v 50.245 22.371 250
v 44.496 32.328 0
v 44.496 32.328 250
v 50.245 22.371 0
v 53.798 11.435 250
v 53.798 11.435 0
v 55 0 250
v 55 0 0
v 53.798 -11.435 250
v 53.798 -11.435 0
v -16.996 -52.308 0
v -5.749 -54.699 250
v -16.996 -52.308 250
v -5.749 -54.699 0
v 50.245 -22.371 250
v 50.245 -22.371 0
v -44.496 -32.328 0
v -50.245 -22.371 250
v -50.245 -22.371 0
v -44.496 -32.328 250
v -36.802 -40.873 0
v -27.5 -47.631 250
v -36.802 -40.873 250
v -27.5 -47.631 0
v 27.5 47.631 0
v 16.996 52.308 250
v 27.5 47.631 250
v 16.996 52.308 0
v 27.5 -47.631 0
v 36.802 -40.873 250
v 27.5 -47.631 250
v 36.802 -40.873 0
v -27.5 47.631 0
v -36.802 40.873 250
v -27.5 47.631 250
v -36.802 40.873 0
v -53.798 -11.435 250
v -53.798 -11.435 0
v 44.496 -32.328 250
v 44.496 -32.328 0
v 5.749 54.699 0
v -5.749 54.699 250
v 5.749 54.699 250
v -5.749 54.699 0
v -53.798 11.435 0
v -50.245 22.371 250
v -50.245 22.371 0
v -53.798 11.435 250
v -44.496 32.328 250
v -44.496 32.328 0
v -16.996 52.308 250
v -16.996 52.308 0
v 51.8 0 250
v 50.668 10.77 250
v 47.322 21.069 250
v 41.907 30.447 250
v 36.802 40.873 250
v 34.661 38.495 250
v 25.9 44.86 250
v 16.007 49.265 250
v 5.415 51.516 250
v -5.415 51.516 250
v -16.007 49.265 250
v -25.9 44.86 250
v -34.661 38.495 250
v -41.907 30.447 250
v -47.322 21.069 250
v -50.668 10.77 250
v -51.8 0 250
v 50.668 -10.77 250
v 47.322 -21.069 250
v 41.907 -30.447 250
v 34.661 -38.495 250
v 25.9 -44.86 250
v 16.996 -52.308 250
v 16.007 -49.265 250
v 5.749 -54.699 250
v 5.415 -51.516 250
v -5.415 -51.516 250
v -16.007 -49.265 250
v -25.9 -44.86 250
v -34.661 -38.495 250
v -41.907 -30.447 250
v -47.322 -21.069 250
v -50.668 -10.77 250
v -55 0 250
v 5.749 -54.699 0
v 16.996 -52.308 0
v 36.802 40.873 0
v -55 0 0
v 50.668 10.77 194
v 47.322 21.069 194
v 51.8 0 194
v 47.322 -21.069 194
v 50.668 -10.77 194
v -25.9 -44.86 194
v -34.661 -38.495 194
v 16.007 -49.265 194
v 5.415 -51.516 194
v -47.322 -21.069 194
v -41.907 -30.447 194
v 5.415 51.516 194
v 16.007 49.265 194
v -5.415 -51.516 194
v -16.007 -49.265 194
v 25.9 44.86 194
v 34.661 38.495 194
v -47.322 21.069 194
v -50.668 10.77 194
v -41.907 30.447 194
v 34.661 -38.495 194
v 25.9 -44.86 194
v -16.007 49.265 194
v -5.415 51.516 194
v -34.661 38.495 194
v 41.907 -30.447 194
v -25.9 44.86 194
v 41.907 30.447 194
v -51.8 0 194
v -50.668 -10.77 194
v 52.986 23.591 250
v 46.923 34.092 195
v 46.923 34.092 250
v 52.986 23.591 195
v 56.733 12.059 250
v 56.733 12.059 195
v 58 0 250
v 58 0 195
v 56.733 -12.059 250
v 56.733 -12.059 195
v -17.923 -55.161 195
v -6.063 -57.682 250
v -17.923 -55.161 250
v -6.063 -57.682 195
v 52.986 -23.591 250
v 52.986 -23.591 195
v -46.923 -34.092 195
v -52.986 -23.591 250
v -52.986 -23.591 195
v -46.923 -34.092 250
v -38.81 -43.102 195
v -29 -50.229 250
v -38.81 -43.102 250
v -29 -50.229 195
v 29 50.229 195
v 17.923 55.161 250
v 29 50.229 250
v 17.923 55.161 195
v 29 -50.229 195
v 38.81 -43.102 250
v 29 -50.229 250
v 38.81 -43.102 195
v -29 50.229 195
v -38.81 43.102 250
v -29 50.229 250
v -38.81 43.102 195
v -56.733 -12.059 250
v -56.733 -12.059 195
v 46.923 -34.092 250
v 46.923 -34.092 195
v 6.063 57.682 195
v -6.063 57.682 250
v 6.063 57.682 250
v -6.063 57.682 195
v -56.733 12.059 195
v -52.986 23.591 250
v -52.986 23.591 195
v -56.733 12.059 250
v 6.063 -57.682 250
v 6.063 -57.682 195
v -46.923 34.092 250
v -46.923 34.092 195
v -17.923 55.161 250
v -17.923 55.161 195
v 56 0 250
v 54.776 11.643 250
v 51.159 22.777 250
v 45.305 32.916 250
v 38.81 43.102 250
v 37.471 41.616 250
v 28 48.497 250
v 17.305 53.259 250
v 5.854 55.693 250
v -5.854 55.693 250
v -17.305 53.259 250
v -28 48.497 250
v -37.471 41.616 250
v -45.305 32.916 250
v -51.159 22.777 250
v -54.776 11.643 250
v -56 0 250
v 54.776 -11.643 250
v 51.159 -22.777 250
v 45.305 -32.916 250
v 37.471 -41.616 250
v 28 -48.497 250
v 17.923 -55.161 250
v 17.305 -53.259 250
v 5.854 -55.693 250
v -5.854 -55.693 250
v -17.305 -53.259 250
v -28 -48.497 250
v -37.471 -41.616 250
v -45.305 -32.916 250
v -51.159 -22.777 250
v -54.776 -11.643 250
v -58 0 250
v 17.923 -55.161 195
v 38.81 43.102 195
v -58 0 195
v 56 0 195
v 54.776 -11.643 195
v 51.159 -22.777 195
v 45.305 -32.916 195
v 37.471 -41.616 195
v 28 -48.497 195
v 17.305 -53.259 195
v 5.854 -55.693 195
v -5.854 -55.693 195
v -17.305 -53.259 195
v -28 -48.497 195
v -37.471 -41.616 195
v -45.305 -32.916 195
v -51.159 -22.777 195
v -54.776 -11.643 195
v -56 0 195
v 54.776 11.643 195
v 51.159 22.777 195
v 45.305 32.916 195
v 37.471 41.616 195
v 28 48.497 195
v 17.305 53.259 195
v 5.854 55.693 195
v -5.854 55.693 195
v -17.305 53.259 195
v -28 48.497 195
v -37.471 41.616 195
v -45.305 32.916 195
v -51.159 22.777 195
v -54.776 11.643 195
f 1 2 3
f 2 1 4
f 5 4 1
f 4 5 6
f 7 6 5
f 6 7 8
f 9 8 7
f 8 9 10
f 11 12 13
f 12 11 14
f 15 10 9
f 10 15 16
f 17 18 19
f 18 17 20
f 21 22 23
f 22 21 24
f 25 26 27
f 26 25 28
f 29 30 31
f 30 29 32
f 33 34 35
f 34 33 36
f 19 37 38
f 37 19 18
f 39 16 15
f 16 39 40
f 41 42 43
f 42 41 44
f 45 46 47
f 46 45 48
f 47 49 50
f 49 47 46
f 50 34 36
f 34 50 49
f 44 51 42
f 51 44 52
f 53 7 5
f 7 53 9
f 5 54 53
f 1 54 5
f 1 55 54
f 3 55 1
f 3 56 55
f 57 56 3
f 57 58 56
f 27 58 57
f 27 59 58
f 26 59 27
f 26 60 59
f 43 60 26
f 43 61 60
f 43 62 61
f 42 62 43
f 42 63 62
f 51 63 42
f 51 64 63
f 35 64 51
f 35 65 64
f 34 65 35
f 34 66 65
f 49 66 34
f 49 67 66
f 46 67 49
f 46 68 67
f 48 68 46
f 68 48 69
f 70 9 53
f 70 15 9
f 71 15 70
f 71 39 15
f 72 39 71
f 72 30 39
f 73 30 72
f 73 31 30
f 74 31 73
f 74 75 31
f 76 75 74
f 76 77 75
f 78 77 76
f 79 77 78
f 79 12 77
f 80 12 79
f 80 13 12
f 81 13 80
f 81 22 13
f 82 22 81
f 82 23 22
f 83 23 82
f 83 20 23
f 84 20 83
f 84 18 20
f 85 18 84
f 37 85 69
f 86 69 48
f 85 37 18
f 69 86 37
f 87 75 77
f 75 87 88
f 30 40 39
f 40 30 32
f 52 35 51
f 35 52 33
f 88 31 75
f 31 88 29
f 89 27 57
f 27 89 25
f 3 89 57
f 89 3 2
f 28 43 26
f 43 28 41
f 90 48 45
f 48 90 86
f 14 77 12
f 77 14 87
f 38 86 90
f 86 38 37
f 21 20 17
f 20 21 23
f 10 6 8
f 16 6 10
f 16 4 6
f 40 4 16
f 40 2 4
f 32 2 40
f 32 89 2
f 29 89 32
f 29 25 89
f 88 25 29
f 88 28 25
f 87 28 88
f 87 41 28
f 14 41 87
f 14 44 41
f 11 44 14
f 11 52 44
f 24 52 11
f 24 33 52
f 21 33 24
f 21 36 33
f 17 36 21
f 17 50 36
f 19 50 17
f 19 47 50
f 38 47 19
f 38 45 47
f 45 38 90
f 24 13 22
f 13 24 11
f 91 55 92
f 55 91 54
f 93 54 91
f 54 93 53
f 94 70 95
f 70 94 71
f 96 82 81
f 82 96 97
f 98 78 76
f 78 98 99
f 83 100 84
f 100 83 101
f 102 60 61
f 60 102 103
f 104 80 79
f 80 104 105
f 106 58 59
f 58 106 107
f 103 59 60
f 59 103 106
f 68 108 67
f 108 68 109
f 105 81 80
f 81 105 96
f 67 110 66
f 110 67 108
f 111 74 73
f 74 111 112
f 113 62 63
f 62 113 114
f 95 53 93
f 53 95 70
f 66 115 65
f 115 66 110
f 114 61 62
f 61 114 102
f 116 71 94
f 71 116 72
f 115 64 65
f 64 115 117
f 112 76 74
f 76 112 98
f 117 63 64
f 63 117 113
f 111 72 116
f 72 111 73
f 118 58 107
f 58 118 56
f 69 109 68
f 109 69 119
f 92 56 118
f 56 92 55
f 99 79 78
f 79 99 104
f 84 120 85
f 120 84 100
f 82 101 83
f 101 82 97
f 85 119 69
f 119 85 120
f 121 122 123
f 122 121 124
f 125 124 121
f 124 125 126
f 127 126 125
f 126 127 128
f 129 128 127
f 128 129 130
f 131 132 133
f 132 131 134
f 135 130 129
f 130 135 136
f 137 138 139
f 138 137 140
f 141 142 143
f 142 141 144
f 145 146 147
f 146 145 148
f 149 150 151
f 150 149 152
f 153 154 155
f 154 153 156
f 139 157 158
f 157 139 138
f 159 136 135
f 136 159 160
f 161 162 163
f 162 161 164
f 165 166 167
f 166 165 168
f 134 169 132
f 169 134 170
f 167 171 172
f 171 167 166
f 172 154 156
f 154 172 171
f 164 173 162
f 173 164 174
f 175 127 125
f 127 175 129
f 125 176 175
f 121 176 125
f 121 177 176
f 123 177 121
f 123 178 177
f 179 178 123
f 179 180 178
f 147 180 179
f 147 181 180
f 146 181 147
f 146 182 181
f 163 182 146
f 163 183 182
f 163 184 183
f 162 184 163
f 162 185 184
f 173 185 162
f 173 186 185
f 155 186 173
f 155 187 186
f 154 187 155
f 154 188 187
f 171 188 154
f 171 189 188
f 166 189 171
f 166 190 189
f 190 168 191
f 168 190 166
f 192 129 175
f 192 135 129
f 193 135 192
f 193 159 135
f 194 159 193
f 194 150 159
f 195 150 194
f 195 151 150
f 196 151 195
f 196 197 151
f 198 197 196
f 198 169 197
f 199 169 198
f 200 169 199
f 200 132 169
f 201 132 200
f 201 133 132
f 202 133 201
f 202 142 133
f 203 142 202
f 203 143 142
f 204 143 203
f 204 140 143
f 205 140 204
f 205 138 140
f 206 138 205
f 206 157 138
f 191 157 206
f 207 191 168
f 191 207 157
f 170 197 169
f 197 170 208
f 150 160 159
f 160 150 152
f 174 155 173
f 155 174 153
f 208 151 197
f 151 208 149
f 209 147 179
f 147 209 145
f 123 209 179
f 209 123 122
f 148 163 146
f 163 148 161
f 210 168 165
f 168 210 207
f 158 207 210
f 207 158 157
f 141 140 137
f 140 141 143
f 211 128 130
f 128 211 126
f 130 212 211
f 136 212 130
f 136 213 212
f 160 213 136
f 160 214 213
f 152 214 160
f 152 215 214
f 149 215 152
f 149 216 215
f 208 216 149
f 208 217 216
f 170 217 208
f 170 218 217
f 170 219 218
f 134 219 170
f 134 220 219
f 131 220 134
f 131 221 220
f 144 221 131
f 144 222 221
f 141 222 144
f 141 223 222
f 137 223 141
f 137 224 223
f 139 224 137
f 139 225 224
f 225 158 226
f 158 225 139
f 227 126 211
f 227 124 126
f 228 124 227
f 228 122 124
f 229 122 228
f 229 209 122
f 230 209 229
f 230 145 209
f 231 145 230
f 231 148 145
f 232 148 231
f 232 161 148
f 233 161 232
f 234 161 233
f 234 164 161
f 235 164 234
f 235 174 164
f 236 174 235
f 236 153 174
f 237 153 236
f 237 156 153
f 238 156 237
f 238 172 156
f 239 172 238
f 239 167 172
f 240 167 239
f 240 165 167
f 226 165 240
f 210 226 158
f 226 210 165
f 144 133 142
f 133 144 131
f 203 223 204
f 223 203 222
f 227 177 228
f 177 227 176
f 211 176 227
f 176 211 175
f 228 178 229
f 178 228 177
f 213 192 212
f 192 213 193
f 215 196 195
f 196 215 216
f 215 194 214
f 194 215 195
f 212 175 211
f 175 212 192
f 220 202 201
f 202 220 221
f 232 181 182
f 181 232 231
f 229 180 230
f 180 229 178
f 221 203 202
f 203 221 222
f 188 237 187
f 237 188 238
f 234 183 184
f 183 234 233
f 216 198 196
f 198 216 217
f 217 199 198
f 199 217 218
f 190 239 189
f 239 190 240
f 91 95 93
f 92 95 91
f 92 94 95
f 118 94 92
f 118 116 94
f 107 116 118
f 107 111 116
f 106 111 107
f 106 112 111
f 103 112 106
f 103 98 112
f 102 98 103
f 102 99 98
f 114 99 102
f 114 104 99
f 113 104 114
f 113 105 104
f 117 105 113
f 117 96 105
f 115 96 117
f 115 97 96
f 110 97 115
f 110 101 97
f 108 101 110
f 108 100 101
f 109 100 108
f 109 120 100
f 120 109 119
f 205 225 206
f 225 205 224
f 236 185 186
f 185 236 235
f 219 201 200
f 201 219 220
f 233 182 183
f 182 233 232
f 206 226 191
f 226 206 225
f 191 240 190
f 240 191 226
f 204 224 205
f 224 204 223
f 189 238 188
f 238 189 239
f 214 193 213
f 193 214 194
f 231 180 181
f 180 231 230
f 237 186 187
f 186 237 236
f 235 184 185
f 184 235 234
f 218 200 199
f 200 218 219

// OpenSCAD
// Parameters
pipe_standard = 1; //[1:1:1]
nominal_diameter_mm = 110; //[55:220:1]
length_mm = 250; //[125:500:1]
pipe_od_mm = 110; //[55:220:0.5]
pipe_wall_mm = 3.2; //[1.6:6.4:0.1]
fitting_length_mm = 55; //[28:110:1]
fitting_wall_extra_mm = 2.0; //[1.0:4.0:0.1]
fitting_od_extra_mm = 6.0; //[3.0:12.0:0.5]
socket_clearance_mm = 1.0; //[0.4:2.0:0.1]
stop_ring_thickness_mm = 3.0; //[1.5:6.0:0.5]
stop_ring_radial_mm = 2.0; //[1.0:4.0:0.1]
overlap_mm = 1.0; //[0.5:2.0:0.1]

// Module for HT Pipe
module ht_pipe() {
  color([0.85, 0.85, 0.8]) {
    // Outer pipe
    difference() {
      cylinder(h=length_mm, r=pipe_od_mm/2, center=false);
      // Inner bore
      translate([0, 0, -overlap_mm])
        cylinder(h=length_mm + 2*overlap_mm, r=pipe_od_mm/2 - pipe_wall_mm, center=false);
    }
    
    // Integrated end fitting
    difference() {
      union() {
        // Fitting outer
        translate([0, 0, length_mm - fitting_length_mm])
          cylinder(h=fitting_length_mm, r=pipe_od_mm/2 + fitting_od_extra_mm/2, center=false);
        // Pipe outer
        cylinder(h=length_mm, r=pipe_od_mm/2, center=false);
      }
      // Socket void
      translate([0, 0, length_mm - fitting_length_mm - overlap_mm])
        cylinder(h=fitting_length_mm + 2*overlap_mm, r=pipe_od_mm/2 + socket_clearance_mm, center=false);
      // Stop ring void
      translate([0, 0, length_mm - fitting_length_mm + (fitting_length_mm - stop_ring_thickness_mm)/2 - overlap_mm])
        cylinder(h=stop_ring_thickness_mm + 2*overlap_mm, r=pipe_od_mm/2 + socket_clearance_mm - stop_ring_radial_mm, center=false);
    }
  }
}

// Assembly
module assembly() {
  ht_pipe();
}

assembly();
